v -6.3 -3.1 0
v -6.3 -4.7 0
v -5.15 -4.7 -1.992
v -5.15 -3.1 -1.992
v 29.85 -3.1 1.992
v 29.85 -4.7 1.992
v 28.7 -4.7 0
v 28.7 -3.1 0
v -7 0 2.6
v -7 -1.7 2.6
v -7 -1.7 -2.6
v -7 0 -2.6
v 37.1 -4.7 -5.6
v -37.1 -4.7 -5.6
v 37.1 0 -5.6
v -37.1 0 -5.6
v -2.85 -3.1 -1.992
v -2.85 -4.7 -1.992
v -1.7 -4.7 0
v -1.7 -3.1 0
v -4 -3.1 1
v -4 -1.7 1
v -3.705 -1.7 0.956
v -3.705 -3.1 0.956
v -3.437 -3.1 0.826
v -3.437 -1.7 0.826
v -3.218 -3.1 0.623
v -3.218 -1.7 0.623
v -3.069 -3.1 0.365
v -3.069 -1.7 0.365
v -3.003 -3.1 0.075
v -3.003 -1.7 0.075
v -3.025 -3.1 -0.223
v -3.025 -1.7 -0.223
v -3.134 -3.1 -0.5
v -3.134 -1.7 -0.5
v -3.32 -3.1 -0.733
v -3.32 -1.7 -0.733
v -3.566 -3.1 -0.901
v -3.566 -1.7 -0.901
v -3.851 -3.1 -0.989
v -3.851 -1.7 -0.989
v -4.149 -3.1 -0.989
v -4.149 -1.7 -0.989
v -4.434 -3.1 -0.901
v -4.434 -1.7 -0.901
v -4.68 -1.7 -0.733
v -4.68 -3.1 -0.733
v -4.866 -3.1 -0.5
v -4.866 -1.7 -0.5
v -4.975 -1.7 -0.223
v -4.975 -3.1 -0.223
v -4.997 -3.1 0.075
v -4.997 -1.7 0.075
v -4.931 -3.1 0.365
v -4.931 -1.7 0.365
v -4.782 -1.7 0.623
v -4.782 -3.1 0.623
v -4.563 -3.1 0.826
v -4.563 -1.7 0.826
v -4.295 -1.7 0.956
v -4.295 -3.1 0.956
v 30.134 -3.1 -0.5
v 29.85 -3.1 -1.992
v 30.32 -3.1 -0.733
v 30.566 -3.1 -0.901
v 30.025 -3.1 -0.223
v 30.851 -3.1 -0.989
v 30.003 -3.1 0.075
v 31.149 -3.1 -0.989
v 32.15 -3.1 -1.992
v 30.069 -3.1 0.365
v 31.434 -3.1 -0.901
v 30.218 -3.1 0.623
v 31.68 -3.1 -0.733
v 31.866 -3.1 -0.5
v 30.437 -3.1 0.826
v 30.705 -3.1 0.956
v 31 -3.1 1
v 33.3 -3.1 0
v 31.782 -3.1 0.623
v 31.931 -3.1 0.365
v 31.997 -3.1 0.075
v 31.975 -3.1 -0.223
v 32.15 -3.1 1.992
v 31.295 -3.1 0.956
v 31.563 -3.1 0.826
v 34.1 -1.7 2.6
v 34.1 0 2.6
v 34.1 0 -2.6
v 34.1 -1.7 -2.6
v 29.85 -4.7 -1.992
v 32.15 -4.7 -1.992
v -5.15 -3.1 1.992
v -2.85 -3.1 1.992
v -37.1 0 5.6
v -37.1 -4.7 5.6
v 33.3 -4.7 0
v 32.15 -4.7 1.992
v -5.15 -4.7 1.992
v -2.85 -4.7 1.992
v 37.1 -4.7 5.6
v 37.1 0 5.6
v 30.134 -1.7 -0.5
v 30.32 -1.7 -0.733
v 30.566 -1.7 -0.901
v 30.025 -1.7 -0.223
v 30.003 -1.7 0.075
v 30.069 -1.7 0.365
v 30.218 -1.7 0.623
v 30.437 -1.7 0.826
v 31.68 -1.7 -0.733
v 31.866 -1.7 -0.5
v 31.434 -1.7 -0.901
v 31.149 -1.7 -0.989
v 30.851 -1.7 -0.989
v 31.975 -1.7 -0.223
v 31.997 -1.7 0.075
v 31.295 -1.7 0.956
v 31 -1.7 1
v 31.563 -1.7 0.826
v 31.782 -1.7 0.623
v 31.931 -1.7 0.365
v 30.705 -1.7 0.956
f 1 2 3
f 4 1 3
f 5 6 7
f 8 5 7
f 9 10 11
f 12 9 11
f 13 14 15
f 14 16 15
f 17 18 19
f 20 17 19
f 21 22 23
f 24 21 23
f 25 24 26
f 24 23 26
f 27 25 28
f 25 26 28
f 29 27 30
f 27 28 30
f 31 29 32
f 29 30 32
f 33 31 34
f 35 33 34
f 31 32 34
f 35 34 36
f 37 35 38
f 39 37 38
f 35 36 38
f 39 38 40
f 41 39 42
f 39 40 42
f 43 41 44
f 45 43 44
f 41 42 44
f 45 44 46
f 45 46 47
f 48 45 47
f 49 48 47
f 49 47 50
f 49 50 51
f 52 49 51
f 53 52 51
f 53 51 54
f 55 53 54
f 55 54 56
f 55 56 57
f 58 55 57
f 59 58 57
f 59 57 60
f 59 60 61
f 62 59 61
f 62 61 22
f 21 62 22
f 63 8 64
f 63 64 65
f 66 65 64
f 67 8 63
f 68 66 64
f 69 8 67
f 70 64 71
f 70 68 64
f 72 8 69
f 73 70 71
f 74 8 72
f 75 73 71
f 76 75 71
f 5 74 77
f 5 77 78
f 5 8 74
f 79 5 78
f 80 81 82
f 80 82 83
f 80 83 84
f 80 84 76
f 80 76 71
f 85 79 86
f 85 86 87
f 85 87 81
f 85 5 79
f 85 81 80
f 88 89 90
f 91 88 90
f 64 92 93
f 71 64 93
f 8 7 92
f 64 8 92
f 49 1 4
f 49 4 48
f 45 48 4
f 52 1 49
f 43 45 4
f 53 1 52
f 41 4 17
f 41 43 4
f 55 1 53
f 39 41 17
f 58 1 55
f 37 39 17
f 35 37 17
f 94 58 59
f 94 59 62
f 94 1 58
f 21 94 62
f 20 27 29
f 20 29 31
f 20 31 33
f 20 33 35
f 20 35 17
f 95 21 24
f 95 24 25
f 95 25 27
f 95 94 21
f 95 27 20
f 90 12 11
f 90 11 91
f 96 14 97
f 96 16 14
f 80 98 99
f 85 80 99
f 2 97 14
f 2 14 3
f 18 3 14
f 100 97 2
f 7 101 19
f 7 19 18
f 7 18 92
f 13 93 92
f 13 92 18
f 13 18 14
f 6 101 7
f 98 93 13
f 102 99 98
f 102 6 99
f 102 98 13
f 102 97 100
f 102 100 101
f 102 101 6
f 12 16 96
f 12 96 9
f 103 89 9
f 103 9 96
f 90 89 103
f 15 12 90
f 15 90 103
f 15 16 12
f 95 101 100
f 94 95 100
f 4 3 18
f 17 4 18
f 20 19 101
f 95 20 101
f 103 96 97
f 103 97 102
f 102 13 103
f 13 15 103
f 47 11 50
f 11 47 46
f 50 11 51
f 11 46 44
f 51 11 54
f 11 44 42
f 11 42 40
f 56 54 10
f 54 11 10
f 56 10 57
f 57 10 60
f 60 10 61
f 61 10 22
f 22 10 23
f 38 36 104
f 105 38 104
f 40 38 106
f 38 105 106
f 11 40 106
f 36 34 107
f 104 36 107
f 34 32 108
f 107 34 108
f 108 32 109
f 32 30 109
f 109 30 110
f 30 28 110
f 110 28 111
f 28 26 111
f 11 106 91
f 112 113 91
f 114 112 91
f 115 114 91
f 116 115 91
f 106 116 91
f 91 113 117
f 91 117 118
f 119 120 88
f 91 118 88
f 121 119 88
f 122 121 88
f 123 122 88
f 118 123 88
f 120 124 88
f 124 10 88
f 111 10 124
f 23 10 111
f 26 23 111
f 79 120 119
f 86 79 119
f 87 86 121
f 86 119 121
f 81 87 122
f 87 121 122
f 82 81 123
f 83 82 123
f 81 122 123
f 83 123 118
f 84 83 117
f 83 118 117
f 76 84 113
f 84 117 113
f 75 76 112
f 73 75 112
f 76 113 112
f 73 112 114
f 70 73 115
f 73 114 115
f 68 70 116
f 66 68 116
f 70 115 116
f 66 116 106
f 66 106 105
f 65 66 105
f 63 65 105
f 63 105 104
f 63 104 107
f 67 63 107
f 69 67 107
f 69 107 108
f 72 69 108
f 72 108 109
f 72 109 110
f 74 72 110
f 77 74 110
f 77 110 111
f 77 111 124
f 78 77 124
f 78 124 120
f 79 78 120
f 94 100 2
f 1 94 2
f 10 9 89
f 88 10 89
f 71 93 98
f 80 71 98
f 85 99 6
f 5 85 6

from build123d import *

# Parameters (mm, degrees)
SKETCH1_W           = 74.2
SKETCH1_H           = 11.2
SKETCH1_W_2         = 68.2
SKETCH1_H_2         = 5.2
BOSS_EXTRUDE1_DEPTH = 1.7
SKETCH2_W           = 74.2
SKETCH2_H           = 11.2
BOSS_EXTRUDE2_DEPTH = 3
SKETCH5_R           = 1
CUT_EXTRUDE1_DEPTH  = 3
CUT_EXTRUDE2_DEPTH  = 1.6
SKETCH8_W           = 27.1
SKETCH8_H           = 5.2
BOSS_EXTRUDE3_DEPTH = 1.7


with BuildPart() as part:
    # Sketch1 → Boss-Extrude1 (new body)
    with BuildSketch(Plane(origin=(0, 0, 0), x_dir=(1, 0, 0), z_dir=(0, 1, 0))):
        Rectangle(SKETCH1_W, SKETCH1_H)
        Rectangle(SKETCH1_W_2, SKETCH1_H_2, mode=Mode.SUBTRACT)
    extrude(amount=-BOSS_EXTRUDE1_DEPTH)

    # Sketch2 → Boss-Extrude2 (add)
    with BuildSketch(Plane.XZ.offset(1.7)):
        Rectangle(SKETCH2_W, SKETCH2_H)
    extrude(amount=BOSS_EXTRUDE2_DEPTH)

    # Sketch5 → Cut-Extrude1 (cut)
    with BuildSketch(Plane(origin=(0, -1.7, 0), x_dir=(1, 0, 0), z_dir=(0, 1, 0))):
        with Locations(Location((-4, 0, 0), (0, 0, 270))):
            Circle(SKETCH5_R)
        with Locations(Location((31, 0, 0), (0, 0, 270))):
            Circle(SKETCH5_R)
    extrude(amount=-CUT_EXTRUDE1_DEPTH, mode=Mode.SUBTRACT)

    # Sketch7 → Cut-Extrude2 (cut)
    with BuildSketch(Plane.XZ.offset(4.7)):
        Polygon((-5.15, 1.991858429), (-6.3, 0), (-5.15, -1.991858429), (-2.85, -1.991858429), (-1.7, 0), (-2.85, 1.991858429), align=None)
        Polygon((33.3, 0), (32.15, 1.991858429), (29.85, 1.991858429), (28.7, 0), (29.85, -1.991858429), (32.15, -1.991858429), align=None)
    extrude(amount=-CUT_EXTRUDE2_DEPTH, mode=Mode.SUBTRACT)

    # Sketch8 → Boss-Extrude3 (add)
    with BuildSketch(Plane(origin=(0, -1.7, 0), x_dir=(1, 0, 0), z_dir=(0, 1, 0))):
        with Locations((-20.55, 0)):
            Rectangle(SKETCH8_W, SKETCH8_H)
    extrude(amount=BOSS_EXTRUDE3_DEPTH)


solid = part.part
